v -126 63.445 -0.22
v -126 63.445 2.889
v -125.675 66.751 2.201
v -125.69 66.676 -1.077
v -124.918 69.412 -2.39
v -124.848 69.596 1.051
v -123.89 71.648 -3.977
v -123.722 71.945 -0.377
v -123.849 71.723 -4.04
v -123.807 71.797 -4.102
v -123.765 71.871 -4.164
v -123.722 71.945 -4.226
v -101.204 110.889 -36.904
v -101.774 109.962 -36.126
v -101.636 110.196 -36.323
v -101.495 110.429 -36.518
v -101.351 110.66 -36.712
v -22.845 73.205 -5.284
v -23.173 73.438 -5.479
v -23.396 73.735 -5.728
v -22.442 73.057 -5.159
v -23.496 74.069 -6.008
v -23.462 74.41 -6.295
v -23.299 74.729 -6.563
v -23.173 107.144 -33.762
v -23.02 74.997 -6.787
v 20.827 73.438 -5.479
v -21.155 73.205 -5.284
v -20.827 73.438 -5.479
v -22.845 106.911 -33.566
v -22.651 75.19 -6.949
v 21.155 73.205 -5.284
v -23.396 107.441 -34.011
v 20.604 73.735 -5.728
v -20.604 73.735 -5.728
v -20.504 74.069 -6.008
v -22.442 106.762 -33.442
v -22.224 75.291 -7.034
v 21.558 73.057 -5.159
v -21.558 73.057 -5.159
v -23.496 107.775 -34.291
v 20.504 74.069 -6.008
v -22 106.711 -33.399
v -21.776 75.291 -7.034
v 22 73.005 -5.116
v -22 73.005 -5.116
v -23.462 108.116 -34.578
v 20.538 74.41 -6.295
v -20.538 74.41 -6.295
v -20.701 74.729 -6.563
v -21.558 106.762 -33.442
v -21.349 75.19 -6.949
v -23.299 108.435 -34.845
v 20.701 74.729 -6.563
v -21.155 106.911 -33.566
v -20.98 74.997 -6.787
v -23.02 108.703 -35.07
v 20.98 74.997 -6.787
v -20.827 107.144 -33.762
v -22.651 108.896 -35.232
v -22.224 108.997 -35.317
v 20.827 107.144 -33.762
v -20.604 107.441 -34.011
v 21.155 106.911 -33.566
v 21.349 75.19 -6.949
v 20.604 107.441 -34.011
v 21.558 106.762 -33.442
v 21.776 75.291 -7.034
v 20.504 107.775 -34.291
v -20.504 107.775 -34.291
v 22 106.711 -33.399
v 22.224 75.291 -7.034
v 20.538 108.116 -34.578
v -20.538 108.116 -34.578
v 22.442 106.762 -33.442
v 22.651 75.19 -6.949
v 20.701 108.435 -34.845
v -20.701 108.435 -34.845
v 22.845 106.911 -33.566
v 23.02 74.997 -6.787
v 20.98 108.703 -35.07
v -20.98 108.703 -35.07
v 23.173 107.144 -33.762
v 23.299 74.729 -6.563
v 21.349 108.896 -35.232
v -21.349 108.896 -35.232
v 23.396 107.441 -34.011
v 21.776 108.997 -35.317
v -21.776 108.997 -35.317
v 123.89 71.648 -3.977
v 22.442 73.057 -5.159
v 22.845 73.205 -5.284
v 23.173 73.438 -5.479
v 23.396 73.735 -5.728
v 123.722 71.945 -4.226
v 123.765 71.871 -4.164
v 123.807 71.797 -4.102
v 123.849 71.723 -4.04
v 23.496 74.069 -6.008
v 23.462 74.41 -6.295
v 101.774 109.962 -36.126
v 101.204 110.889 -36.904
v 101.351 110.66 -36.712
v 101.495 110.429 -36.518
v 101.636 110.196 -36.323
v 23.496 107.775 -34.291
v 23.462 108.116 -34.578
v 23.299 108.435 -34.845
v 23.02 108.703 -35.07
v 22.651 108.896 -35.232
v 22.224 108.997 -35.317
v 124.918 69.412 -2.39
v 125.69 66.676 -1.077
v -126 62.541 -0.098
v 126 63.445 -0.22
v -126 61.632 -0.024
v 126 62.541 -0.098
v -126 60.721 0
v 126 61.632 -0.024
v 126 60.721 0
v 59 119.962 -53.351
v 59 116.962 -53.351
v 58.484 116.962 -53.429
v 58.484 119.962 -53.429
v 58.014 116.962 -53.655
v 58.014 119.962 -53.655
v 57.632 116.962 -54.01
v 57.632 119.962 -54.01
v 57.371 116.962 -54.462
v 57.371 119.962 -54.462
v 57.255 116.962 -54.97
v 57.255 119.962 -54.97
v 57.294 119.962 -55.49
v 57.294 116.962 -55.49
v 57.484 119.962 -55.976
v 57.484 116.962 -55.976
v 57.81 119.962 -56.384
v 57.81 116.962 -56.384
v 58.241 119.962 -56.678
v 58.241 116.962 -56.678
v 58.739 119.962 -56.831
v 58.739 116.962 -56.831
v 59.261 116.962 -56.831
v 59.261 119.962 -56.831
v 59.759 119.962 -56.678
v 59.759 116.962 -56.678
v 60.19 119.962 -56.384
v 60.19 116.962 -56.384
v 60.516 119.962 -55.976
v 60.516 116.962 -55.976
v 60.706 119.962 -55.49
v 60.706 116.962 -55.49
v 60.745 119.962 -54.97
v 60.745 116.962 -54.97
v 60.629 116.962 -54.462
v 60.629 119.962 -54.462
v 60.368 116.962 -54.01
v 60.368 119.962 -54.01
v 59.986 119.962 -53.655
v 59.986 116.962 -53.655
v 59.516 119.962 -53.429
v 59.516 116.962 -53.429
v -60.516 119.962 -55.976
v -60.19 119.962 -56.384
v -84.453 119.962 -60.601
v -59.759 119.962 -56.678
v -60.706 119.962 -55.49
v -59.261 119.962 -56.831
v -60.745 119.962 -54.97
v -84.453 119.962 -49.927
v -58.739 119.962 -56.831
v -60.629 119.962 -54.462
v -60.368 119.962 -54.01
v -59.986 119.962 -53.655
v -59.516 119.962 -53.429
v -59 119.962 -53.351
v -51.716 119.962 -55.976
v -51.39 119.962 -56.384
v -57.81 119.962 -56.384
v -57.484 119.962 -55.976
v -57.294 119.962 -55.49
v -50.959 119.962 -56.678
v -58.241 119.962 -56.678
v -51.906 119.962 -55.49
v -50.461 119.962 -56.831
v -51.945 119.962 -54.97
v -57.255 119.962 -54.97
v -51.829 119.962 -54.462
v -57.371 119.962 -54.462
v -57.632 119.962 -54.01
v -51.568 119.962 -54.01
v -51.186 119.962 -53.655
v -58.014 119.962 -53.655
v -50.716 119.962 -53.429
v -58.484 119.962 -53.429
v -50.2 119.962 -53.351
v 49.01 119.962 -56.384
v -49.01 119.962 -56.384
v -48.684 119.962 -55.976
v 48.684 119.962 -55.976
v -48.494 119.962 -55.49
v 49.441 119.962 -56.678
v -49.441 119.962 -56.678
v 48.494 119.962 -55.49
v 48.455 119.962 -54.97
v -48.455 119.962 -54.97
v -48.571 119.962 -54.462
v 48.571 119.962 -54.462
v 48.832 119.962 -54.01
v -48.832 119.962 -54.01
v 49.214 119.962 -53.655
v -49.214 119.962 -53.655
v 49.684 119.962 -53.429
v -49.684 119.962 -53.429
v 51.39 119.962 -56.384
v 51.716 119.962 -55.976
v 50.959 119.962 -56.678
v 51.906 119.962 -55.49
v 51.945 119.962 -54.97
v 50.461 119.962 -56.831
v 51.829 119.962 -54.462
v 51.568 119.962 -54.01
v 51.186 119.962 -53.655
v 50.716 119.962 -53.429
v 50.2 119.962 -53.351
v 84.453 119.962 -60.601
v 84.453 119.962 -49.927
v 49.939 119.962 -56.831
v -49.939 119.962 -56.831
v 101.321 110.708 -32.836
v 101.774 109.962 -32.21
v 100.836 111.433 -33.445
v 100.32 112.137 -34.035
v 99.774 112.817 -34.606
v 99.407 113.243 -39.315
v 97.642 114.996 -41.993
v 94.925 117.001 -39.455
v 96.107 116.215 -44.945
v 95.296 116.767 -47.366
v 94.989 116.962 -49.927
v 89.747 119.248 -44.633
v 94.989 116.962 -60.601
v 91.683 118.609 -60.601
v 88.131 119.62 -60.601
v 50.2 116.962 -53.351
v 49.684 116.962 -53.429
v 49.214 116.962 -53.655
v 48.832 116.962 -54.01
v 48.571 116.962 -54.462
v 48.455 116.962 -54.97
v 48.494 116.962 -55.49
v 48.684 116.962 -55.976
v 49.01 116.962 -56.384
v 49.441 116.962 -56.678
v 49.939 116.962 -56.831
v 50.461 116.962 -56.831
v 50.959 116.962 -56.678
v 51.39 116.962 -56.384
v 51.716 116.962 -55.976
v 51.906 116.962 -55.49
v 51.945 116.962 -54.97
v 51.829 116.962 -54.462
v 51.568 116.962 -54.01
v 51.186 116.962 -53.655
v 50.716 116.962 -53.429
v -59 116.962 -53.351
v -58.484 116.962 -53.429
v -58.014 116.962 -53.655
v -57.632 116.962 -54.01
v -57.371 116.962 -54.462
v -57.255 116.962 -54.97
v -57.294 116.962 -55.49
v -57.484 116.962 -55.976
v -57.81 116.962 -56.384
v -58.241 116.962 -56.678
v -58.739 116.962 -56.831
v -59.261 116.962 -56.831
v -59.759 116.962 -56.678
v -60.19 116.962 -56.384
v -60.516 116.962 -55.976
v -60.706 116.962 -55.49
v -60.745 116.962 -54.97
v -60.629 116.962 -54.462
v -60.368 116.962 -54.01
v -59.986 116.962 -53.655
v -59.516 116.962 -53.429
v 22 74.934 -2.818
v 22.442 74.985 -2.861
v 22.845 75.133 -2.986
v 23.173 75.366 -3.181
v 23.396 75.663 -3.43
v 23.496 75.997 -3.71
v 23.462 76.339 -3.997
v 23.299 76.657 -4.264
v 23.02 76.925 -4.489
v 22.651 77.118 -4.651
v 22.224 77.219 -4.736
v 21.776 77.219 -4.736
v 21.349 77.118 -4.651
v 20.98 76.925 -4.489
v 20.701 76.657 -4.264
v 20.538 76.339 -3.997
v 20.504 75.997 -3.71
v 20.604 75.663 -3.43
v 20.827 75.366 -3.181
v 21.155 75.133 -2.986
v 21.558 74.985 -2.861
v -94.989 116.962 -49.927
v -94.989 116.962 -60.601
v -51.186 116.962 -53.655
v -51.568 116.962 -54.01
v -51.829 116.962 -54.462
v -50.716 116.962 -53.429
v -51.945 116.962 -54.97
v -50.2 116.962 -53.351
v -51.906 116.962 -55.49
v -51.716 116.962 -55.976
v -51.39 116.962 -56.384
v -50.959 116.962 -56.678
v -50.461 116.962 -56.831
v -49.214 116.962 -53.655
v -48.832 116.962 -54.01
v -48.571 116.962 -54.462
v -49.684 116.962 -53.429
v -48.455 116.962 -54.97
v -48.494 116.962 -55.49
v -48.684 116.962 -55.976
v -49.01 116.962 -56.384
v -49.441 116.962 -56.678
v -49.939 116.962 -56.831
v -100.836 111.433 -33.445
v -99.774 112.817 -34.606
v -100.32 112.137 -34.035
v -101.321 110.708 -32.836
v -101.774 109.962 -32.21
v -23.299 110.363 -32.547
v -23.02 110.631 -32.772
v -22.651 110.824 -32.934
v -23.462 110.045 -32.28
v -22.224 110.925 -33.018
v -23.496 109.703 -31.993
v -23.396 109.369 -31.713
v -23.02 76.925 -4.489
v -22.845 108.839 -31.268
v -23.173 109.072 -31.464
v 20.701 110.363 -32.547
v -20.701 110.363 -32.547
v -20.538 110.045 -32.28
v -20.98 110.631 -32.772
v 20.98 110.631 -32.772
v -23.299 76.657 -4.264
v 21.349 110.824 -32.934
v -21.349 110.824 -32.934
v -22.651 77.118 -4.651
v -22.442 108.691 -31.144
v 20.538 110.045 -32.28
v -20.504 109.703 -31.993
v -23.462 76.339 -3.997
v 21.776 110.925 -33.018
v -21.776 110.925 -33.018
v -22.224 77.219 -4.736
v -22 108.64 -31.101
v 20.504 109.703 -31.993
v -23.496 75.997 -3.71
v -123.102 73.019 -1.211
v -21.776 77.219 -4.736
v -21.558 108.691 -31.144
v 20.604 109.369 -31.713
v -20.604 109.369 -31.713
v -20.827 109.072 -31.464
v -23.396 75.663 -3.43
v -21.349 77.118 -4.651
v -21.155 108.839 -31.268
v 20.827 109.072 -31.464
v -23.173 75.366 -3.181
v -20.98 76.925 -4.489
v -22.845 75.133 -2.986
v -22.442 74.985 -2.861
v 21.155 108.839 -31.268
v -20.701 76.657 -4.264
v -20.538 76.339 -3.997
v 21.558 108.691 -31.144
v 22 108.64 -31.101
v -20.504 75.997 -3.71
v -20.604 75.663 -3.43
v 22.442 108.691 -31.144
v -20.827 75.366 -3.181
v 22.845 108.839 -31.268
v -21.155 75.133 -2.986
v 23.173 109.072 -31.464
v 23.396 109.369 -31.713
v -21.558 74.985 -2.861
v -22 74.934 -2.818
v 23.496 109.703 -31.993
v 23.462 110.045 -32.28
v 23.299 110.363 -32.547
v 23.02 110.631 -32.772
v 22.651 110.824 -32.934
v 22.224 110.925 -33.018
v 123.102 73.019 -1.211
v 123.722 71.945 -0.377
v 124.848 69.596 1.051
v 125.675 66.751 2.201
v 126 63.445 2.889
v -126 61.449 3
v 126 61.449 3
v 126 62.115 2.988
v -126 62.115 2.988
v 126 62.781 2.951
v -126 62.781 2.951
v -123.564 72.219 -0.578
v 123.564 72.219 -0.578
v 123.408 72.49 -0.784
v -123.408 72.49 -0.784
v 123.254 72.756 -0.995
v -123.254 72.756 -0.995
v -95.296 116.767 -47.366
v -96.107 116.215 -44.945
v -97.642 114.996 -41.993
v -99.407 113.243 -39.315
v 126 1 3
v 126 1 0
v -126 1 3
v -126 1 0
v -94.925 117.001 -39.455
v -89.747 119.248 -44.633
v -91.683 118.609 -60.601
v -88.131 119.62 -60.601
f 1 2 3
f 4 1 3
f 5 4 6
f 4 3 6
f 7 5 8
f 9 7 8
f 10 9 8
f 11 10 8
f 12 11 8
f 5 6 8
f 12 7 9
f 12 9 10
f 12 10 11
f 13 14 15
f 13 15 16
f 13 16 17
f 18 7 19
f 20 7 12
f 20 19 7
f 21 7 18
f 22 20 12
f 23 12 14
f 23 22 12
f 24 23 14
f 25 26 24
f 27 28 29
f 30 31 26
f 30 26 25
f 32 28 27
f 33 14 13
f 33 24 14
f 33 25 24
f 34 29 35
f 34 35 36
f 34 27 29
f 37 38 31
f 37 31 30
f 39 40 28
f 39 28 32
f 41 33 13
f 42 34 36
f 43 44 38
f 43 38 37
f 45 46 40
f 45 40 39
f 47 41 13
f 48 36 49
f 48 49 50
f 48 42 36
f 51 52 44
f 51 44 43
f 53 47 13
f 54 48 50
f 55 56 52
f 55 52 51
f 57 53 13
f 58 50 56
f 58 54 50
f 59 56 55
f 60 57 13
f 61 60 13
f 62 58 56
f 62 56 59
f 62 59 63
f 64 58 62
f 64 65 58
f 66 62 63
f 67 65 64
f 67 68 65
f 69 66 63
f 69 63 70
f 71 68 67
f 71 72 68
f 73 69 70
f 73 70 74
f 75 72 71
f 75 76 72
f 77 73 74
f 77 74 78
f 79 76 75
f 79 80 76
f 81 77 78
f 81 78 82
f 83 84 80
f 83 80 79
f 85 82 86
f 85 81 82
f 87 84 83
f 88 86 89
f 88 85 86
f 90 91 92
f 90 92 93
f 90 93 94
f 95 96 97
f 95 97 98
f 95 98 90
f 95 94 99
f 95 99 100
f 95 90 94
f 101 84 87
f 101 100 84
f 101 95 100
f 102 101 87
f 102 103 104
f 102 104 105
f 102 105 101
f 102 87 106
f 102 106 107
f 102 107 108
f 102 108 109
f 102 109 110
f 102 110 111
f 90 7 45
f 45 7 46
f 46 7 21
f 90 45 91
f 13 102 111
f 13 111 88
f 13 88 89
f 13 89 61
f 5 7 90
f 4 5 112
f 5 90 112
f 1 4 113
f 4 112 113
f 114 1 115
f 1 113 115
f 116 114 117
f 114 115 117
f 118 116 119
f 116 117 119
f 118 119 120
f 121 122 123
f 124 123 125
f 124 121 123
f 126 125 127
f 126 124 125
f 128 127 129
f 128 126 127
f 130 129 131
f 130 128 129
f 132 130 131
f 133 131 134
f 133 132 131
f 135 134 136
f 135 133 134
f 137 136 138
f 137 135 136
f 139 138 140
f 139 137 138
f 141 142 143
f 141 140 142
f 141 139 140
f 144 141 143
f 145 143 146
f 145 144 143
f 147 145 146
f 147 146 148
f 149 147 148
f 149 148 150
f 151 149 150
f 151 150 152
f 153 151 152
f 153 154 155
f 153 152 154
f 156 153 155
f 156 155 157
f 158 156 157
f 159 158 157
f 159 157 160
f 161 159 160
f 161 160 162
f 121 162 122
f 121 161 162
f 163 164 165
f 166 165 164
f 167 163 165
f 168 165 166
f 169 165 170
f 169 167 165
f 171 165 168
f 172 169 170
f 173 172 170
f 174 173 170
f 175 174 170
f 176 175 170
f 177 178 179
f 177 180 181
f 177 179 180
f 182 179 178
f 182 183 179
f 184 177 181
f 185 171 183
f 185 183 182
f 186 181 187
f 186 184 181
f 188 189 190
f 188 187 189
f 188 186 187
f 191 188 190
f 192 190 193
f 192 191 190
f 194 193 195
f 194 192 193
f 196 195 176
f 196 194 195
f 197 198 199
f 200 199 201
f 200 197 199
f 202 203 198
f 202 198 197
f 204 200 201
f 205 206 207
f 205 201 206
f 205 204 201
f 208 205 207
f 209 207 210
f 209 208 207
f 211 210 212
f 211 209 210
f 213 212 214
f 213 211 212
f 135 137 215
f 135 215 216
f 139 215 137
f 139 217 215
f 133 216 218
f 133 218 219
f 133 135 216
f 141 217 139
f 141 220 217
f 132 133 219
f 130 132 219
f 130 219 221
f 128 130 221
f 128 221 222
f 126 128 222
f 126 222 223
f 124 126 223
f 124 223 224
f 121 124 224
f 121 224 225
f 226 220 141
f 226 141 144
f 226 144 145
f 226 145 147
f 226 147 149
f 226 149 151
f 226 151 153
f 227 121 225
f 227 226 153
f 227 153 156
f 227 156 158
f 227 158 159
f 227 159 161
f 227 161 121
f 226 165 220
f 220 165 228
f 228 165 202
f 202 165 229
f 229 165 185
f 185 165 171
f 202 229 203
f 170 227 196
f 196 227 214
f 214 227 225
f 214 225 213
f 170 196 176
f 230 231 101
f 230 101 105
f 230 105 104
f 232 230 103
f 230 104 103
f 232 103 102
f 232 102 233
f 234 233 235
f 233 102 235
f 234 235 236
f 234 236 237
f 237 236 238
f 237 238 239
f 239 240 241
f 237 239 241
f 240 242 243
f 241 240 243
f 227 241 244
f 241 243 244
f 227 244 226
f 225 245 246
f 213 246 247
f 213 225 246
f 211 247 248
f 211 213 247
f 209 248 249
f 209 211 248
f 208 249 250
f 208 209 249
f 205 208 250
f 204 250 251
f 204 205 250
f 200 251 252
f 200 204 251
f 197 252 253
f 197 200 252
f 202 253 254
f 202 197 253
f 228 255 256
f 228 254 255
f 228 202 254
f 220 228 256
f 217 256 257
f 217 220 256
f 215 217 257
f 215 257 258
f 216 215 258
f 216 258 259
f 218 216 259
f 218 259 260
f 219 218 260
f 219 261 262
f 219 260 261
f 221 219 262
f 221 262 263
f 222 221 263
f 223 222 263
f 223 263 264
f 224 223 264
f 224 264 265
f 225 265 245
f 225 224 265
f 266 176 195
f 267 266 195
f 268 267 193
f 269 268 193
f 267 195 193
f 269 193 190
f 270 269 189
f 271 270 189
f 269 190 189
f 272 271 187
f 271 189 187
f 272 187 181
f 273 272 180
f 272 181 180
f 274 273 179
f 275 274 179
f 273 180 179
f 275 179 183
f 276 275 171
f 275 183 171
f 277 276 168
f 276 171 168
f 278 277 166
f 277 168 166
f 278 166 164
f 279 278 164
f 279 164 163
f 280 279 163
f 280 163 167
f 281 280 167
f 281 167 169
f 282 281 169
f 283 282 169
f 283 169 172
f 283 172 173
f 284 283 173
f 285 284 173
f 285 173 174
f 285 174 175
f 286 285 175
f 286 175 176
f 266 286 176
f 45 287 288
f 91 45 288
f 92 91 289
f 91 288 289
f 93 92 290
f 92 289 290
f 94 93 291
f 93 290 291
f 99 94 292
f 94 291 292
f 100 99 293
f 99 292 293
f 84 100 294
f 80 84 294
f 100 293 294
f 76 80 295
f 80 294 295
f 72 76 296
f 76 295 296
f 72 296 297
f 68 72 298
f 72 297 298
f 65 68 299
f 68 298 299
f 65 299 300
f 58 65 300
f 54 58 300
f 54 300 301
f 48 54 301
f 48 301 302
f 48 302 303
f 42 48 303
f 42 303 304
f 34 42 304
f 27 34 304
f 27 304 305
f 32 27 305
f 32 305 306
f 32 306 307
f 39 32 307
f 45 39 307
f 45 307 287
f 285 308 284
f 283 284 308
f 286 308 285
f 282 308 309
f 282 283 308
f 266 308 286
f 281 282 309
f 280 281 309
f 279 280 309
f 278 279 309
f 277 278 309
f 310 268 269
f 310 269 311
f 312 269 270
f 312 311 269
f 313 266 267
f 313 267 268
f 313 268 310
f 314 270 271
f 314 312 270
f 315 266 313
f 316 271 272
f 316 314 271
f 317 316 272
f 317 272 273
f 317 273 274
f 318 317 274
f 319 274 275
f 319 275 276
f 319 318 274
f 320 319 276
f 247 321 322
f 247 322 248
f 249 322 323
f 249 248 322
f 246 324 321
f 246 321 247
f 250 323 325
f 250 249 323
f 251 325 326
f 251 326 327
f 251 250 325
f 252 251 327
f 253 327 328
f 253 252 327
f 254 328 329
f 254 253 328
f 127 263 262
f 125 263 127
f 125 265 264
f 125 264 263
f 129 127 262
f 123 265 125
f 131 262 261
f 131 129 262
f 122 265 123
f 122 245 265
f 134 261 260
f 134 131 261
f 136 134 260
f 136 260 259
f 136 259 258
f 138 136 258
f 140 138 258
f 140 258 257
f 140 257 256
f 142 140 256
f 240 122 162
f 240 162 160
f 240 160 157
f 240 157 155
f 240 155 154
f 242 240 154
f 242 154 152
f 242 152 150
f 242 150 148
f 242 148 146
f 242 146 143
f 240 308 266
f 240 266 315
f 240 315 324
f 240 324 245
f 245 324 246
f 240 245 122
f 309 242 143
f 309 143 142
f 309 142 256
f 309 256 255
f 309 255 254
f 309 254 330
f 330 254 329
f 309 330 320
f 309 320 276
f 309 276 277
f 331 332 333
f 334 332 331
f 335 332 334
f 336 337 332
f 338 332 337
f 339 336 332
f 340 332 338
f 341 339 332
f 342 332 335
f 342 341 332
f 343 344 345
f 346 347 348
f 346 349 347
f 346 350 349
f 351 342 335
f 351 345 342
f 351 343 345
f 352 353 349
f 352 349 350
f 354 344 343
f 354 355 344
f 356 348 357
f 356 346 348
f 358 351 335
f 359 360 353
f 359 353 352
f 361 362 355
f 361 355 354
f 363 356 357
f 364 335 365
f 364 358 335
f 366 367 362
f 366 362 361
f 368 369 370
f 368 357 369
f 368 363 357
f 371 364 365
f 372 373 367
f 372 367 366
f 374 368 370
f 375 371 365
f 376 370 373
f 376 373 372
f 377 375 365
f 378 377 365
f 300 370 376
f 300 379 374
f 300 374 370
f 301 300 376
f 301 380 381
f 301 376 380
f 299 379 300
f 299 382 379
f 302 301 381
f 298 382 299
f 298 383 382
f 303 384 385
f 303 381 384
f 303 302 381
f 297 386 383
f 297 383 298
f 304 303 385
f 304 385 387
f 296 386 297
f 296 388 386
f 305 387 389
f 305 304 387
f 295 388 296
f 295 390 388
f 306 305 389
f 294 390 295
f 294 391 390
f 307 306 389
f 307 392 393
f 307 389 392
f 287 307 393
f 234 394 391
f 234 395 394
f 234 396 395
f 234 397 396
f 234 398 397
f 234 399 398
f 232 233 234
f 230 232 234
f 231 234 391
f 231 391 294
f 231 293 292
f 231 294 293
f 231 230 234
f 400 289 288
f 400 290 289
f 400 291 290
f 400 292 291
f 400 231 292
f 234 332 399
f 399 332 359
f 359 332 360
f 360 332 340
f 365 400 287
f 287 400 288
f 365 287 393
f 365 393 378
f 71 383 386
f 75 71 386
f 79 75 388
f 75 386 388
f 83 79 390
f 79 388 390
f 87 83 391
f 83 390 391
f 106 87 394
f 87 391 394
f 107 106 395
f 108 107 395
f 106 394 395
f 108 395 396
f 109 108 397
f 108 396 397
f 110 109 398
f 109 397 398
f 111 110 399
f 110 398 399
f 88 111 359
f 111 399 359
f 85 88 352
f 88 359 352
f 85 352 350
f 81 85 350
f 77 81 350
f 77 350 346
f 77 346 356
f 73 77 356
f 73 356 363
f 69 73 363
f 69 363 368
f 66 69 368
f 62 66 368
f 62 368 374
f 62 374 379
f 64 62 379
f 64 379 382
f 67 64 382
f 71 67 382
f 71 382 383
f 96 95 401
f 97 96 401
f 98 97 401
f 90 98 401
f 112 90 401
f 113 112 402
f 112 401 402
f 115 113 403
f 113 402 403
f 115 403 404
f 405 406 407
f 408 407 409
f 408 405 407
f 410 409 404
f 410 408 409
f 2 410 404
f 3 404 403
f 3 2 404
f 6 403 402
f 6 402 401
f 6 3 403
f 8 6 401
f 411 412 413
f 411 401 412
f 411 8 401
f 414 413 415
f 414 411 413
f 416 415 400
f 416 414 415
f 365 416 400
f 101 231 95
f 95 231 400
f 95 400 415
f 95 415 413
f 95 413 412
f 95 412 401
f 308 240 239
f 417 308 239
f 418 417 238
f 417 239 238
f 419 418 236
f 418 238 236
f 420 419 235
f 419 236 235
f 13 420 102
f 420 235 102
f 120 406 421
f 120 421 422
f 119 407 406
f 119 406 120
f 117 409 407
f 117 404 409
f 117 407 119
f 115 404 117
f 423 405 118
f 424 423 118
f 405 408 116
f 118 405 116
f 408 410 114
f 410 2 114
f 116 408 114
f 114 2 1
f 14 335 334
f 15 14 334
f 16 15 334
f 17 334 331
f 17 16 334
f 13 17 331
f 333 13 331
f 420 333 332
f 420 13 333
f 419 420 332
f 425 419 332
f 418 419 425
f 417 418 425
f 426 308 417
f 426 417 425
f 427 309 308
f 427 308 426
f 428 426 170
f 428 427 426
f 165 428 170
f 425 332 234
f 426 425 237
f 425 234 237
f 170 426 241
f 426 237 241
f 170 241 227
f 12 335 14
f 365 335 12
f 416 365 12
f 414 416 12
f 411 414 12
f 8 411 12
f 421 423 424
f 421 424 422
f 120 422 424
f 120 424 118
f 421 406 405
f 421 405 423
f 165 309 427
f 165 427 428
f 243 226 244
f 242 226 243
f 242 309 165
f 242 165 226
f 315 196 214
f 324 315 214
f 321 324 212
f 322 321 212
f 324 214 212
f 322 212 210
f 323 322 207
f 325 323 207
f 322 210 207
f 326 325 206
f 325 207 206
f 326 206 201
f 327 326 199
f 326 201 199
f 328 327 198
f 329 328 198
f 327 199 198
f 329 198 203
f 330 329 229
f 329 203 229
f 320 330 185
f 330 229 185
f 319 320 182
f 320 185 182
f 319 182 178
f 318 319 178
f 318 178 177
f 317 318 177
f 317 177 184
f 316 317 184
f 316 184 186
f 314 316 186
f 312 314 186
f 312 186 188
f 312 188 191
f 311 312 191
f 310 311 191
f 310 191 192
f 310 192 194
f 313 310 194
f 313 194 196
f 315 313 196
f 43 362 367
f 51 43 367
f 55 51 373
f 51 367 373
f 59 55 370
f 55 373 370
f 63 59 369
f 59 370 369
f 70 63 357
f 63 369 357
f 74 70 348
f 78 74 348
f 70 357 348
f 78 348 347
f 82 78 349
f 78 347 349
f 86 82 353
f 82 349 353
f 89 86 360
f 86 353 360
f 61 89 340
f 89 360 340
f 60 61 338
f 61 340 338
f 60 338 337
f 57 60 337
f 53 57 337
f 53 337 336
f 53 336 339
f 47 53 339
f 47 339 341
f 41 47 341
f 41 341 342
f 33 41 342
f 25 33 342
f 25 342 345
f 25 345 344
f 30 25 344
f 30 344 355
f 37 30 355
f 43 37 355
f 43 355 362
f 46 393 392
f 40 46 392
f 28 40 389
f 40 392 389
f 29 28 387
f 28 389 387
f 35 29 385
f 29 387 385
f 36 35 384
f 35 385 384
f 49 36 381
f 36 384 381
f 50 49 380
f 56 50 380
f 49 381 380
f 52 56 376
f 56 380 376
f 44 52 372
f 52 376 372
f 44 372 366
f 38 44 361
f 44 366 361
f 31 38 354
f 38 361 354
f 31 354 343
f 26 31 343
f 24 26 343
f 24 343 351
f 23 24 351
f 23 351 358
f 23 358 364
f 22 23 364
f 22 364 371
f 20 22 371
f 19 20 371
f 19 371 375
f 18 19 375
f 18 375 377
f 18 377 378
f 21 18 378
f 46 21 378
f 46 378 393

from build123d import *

# Parameters (mm, degrees)
SALIENTE_EXTRUIR1_DEPTH = 126
REDONDEO1_R             = 18
REDONDEO2_R             = 20
REDONDEO3_R             = 17
REDONDEO4_R             = 17
CORTAR_EXTRUIR1_DEPTH   = 186.234557368
REDONDEO5_R             = 17
CORTAR_EXTRUIR2_DEPTH   = 186.23455747
CROQUIS6_R              = 1.75
CORTAR_EXTRUIR3_DEPTH   = 20
CROQUIS7_W              = 252
CROQUIS7_H              = 3
CORTAR_EXTRUIR4_DEPTH   = 1
CROQUIS9_R              = 1.5
CORTAR_EXTRUIR5_DEPTH   = 183.297245602


with BuildPart() as part:
    # Croquis1 → Saliente-Extruir1 (new, symmetric)
    with BuildSketch(Plane(origin=(0, 0, 0), x_dir=(0, 0, -1), z_dir=(1, 0, 0))):
        Polygon((0, 0), (0, 66.908089297), (41.999818789, 116.961524227), (60.600895814, 116.961524227), (60.600895814, 119.961524227), (40.600895814, 119.961524227), (-3, 68), (-3, 0), align=None)
    extrude(amount=SALIENTE_EXTRUIR1_DEPTH, both=True)

    # Redondeo1
    redondeo1_edges = [part.edges().sort_by_distance(p)[0] for p in [
        (0, 68, 3),
    ]]
    fillet(redondeo1_edges, radius=REDONDEO1_R)

    # Redondeo2
    redondeo2_edges = [part.edges().sort_by_distance(p)[0] for p in [
        (0, 119.961524227, -40.600895814),
    ]]
    fillet(redondeo2_edges, radius=REDONDEO2_R)

    # Redondeo3
    redondeo3_edges = [part.edges().sort_by_distance(p)[0] for p in [
        (0, 116.961524227, -41.999818789),
    ]]
    fillet(redondeo3_edges, radius=REDONDEO3_R)

    # Redondeo4
    redondeo4_edges = [part.edges().sort_by_distance(p)[0] for p in [
        (0, 66.908089297, 0),
    ]]
    fillet(redondeo4_edges, radius=REDONDEO4_R)

    # Croquis2 → Cortar-Extruir1 (cut, through all)
    with BuildSketch(Plane.XY.offset(3)):
        Polygon((-96, 119.961524227), (-126, 68), (-126, 119.961524227), align=None)
    cortar_extruir1 = extrude(amount=-CORTAR_EXTRUIR1_DEPTH, mode=Mode.SUBTRACT)

    # Simetría1: Cortar-Extruir1 across plane
    add(cortar_extruir1.mirror(Plane(origin=(0, 0, 0), x_dir=(0, 0, 1), z_dir=(1, 0, 0))), mode=Mode.SUBTRACT)

    # Redondeo5
    # the kernel refuses this fillet: 17 mm, written as the material it takes off along each edge
    with BuildSketch(Plane(origin=(-126, 68, 13.153231119), x_dir=(0, -1, 0), z_dir=(0, 0, -1)), Plane(origin=(126, 68, 13.153231119), x_dir=(-0.49999999999999856, 0.8660254037844395, 0), z_dir=(0, 0, -1))) as redondeo5_piece_1:
        with BuildLine():
            CenterArc((REDONDEO5_R * 0.267949192431, -REDONDEO5_R), REDONDEO5_R, 90, 30)
            Line((-REDONDEO5_R * 0.232050807569, -REDONDEO5_R * 0.133974596216), (0, 0))
            Line((0, 0), (REDONDEO5_R * 0.267949192431, 0))
        make_face()
    extrude(amount=26.178446129, mode=Mode.SUBTRACT)

    # Croquis5 → Cortar-Extruir2 (cut, through all)
    with BuildSketch(Plane(origin=(0, 0, -60.600895814), x_dir=(-1, 0, 0), z_dir=(0, 0, -1))):
        with BuildLine():
            Line((84.452994616, 119.961524227), (96, 119.961524227))
            Line((96, 119.961524227), (101.773502692, 109.961524227))
            ThreePointArc((101.773502692, 109.961524227), (94.452994616, 117.282032303), (84.452994616, 119.961524227))
        make_face()
    cortar_extruir2 = extrude(amount=-CORTAR_EXTRUIR2_DEPTH, mode=Mode.SUBTRACT)

    # Simetría2: Cortar-Extruir2 across plane
    add(cortar_extruir2.mirror(Plane(origin=(0, 0, 0), x_dir=(0, 0, 1), z_dir=(1, 0, 0))), mode=Mode.SUBTRACT)

    # Croquis6 → Cortar-Extruir3 (cut)
    with BuildSketch(Plane(origin=(0, 119.961524227, 0), x_dir=(1, 0, 0), z_dir=(0, 1, 0))):
        with Locations(Location((-59, 55.100895814, 0), (0, 0, 270))):
            Circle(CROQUIS6_R)
        with Locations(Location((-50.2, 55.100895814, 0), (0, 0, 270))):
            Circle(CROQUIS6_R)
    cortar_extruir3 = extrude(amount=-CORTAR_EXTRUIR3_DEPTH, mode=Mode.SUBTRACT)

    # Simetría3: Cortar-Extruir3 across plane
    add(cortar_extruir3.mirror(Plane(origin=(0, 0, 0), x_dir=(0, 0, 1), z_dir=(1, 0, 0))), mode=Mode.SUBTRACT)

    # Croquis7 → Cortar-Extruir4 (cut)
    with BuildSketch(Plane.XZ):
        with Locations((0, 1.5)):
            Rectangle(CROQUIS7_W, CROQUIS7_H)
    extrude(amount=-CORTAR_EXTRUIR4_DEPTH, mode=Mode.SUBTRACT)

    # Croquis9 → Cortar-Extruir5 (cut, through all)
    with BuildSketch(Plane(origin=(0, 29.573173589, 35.243935869), x_dir=(1, 0, 0), z_dir=(0, 0.6427876096865381, 0.7660444431189791))):
        with Locations(Location((-22, 104.71412352, 0), (0, 0, 270))):
            Circle(CROQUIS9_R)
        with Locations(Location((22, 104.71412352, 0), (0, 0, 270))):
            Circle(CROQUIS9_R)
        with Locations(Location((22, 60.71412352, 0), (0, 0, 270))):
            Circle(CROQUIS9_R)
        with Locations(Location((-22, 60.71412352, 0), (0, 0, 270))):
            Circle(CROQUIS9_R)
    extrude(amount=-CORTAR_EXTRUIR5_DEPTH, mode=Mode.SUBTRACT)


solid = part.part
